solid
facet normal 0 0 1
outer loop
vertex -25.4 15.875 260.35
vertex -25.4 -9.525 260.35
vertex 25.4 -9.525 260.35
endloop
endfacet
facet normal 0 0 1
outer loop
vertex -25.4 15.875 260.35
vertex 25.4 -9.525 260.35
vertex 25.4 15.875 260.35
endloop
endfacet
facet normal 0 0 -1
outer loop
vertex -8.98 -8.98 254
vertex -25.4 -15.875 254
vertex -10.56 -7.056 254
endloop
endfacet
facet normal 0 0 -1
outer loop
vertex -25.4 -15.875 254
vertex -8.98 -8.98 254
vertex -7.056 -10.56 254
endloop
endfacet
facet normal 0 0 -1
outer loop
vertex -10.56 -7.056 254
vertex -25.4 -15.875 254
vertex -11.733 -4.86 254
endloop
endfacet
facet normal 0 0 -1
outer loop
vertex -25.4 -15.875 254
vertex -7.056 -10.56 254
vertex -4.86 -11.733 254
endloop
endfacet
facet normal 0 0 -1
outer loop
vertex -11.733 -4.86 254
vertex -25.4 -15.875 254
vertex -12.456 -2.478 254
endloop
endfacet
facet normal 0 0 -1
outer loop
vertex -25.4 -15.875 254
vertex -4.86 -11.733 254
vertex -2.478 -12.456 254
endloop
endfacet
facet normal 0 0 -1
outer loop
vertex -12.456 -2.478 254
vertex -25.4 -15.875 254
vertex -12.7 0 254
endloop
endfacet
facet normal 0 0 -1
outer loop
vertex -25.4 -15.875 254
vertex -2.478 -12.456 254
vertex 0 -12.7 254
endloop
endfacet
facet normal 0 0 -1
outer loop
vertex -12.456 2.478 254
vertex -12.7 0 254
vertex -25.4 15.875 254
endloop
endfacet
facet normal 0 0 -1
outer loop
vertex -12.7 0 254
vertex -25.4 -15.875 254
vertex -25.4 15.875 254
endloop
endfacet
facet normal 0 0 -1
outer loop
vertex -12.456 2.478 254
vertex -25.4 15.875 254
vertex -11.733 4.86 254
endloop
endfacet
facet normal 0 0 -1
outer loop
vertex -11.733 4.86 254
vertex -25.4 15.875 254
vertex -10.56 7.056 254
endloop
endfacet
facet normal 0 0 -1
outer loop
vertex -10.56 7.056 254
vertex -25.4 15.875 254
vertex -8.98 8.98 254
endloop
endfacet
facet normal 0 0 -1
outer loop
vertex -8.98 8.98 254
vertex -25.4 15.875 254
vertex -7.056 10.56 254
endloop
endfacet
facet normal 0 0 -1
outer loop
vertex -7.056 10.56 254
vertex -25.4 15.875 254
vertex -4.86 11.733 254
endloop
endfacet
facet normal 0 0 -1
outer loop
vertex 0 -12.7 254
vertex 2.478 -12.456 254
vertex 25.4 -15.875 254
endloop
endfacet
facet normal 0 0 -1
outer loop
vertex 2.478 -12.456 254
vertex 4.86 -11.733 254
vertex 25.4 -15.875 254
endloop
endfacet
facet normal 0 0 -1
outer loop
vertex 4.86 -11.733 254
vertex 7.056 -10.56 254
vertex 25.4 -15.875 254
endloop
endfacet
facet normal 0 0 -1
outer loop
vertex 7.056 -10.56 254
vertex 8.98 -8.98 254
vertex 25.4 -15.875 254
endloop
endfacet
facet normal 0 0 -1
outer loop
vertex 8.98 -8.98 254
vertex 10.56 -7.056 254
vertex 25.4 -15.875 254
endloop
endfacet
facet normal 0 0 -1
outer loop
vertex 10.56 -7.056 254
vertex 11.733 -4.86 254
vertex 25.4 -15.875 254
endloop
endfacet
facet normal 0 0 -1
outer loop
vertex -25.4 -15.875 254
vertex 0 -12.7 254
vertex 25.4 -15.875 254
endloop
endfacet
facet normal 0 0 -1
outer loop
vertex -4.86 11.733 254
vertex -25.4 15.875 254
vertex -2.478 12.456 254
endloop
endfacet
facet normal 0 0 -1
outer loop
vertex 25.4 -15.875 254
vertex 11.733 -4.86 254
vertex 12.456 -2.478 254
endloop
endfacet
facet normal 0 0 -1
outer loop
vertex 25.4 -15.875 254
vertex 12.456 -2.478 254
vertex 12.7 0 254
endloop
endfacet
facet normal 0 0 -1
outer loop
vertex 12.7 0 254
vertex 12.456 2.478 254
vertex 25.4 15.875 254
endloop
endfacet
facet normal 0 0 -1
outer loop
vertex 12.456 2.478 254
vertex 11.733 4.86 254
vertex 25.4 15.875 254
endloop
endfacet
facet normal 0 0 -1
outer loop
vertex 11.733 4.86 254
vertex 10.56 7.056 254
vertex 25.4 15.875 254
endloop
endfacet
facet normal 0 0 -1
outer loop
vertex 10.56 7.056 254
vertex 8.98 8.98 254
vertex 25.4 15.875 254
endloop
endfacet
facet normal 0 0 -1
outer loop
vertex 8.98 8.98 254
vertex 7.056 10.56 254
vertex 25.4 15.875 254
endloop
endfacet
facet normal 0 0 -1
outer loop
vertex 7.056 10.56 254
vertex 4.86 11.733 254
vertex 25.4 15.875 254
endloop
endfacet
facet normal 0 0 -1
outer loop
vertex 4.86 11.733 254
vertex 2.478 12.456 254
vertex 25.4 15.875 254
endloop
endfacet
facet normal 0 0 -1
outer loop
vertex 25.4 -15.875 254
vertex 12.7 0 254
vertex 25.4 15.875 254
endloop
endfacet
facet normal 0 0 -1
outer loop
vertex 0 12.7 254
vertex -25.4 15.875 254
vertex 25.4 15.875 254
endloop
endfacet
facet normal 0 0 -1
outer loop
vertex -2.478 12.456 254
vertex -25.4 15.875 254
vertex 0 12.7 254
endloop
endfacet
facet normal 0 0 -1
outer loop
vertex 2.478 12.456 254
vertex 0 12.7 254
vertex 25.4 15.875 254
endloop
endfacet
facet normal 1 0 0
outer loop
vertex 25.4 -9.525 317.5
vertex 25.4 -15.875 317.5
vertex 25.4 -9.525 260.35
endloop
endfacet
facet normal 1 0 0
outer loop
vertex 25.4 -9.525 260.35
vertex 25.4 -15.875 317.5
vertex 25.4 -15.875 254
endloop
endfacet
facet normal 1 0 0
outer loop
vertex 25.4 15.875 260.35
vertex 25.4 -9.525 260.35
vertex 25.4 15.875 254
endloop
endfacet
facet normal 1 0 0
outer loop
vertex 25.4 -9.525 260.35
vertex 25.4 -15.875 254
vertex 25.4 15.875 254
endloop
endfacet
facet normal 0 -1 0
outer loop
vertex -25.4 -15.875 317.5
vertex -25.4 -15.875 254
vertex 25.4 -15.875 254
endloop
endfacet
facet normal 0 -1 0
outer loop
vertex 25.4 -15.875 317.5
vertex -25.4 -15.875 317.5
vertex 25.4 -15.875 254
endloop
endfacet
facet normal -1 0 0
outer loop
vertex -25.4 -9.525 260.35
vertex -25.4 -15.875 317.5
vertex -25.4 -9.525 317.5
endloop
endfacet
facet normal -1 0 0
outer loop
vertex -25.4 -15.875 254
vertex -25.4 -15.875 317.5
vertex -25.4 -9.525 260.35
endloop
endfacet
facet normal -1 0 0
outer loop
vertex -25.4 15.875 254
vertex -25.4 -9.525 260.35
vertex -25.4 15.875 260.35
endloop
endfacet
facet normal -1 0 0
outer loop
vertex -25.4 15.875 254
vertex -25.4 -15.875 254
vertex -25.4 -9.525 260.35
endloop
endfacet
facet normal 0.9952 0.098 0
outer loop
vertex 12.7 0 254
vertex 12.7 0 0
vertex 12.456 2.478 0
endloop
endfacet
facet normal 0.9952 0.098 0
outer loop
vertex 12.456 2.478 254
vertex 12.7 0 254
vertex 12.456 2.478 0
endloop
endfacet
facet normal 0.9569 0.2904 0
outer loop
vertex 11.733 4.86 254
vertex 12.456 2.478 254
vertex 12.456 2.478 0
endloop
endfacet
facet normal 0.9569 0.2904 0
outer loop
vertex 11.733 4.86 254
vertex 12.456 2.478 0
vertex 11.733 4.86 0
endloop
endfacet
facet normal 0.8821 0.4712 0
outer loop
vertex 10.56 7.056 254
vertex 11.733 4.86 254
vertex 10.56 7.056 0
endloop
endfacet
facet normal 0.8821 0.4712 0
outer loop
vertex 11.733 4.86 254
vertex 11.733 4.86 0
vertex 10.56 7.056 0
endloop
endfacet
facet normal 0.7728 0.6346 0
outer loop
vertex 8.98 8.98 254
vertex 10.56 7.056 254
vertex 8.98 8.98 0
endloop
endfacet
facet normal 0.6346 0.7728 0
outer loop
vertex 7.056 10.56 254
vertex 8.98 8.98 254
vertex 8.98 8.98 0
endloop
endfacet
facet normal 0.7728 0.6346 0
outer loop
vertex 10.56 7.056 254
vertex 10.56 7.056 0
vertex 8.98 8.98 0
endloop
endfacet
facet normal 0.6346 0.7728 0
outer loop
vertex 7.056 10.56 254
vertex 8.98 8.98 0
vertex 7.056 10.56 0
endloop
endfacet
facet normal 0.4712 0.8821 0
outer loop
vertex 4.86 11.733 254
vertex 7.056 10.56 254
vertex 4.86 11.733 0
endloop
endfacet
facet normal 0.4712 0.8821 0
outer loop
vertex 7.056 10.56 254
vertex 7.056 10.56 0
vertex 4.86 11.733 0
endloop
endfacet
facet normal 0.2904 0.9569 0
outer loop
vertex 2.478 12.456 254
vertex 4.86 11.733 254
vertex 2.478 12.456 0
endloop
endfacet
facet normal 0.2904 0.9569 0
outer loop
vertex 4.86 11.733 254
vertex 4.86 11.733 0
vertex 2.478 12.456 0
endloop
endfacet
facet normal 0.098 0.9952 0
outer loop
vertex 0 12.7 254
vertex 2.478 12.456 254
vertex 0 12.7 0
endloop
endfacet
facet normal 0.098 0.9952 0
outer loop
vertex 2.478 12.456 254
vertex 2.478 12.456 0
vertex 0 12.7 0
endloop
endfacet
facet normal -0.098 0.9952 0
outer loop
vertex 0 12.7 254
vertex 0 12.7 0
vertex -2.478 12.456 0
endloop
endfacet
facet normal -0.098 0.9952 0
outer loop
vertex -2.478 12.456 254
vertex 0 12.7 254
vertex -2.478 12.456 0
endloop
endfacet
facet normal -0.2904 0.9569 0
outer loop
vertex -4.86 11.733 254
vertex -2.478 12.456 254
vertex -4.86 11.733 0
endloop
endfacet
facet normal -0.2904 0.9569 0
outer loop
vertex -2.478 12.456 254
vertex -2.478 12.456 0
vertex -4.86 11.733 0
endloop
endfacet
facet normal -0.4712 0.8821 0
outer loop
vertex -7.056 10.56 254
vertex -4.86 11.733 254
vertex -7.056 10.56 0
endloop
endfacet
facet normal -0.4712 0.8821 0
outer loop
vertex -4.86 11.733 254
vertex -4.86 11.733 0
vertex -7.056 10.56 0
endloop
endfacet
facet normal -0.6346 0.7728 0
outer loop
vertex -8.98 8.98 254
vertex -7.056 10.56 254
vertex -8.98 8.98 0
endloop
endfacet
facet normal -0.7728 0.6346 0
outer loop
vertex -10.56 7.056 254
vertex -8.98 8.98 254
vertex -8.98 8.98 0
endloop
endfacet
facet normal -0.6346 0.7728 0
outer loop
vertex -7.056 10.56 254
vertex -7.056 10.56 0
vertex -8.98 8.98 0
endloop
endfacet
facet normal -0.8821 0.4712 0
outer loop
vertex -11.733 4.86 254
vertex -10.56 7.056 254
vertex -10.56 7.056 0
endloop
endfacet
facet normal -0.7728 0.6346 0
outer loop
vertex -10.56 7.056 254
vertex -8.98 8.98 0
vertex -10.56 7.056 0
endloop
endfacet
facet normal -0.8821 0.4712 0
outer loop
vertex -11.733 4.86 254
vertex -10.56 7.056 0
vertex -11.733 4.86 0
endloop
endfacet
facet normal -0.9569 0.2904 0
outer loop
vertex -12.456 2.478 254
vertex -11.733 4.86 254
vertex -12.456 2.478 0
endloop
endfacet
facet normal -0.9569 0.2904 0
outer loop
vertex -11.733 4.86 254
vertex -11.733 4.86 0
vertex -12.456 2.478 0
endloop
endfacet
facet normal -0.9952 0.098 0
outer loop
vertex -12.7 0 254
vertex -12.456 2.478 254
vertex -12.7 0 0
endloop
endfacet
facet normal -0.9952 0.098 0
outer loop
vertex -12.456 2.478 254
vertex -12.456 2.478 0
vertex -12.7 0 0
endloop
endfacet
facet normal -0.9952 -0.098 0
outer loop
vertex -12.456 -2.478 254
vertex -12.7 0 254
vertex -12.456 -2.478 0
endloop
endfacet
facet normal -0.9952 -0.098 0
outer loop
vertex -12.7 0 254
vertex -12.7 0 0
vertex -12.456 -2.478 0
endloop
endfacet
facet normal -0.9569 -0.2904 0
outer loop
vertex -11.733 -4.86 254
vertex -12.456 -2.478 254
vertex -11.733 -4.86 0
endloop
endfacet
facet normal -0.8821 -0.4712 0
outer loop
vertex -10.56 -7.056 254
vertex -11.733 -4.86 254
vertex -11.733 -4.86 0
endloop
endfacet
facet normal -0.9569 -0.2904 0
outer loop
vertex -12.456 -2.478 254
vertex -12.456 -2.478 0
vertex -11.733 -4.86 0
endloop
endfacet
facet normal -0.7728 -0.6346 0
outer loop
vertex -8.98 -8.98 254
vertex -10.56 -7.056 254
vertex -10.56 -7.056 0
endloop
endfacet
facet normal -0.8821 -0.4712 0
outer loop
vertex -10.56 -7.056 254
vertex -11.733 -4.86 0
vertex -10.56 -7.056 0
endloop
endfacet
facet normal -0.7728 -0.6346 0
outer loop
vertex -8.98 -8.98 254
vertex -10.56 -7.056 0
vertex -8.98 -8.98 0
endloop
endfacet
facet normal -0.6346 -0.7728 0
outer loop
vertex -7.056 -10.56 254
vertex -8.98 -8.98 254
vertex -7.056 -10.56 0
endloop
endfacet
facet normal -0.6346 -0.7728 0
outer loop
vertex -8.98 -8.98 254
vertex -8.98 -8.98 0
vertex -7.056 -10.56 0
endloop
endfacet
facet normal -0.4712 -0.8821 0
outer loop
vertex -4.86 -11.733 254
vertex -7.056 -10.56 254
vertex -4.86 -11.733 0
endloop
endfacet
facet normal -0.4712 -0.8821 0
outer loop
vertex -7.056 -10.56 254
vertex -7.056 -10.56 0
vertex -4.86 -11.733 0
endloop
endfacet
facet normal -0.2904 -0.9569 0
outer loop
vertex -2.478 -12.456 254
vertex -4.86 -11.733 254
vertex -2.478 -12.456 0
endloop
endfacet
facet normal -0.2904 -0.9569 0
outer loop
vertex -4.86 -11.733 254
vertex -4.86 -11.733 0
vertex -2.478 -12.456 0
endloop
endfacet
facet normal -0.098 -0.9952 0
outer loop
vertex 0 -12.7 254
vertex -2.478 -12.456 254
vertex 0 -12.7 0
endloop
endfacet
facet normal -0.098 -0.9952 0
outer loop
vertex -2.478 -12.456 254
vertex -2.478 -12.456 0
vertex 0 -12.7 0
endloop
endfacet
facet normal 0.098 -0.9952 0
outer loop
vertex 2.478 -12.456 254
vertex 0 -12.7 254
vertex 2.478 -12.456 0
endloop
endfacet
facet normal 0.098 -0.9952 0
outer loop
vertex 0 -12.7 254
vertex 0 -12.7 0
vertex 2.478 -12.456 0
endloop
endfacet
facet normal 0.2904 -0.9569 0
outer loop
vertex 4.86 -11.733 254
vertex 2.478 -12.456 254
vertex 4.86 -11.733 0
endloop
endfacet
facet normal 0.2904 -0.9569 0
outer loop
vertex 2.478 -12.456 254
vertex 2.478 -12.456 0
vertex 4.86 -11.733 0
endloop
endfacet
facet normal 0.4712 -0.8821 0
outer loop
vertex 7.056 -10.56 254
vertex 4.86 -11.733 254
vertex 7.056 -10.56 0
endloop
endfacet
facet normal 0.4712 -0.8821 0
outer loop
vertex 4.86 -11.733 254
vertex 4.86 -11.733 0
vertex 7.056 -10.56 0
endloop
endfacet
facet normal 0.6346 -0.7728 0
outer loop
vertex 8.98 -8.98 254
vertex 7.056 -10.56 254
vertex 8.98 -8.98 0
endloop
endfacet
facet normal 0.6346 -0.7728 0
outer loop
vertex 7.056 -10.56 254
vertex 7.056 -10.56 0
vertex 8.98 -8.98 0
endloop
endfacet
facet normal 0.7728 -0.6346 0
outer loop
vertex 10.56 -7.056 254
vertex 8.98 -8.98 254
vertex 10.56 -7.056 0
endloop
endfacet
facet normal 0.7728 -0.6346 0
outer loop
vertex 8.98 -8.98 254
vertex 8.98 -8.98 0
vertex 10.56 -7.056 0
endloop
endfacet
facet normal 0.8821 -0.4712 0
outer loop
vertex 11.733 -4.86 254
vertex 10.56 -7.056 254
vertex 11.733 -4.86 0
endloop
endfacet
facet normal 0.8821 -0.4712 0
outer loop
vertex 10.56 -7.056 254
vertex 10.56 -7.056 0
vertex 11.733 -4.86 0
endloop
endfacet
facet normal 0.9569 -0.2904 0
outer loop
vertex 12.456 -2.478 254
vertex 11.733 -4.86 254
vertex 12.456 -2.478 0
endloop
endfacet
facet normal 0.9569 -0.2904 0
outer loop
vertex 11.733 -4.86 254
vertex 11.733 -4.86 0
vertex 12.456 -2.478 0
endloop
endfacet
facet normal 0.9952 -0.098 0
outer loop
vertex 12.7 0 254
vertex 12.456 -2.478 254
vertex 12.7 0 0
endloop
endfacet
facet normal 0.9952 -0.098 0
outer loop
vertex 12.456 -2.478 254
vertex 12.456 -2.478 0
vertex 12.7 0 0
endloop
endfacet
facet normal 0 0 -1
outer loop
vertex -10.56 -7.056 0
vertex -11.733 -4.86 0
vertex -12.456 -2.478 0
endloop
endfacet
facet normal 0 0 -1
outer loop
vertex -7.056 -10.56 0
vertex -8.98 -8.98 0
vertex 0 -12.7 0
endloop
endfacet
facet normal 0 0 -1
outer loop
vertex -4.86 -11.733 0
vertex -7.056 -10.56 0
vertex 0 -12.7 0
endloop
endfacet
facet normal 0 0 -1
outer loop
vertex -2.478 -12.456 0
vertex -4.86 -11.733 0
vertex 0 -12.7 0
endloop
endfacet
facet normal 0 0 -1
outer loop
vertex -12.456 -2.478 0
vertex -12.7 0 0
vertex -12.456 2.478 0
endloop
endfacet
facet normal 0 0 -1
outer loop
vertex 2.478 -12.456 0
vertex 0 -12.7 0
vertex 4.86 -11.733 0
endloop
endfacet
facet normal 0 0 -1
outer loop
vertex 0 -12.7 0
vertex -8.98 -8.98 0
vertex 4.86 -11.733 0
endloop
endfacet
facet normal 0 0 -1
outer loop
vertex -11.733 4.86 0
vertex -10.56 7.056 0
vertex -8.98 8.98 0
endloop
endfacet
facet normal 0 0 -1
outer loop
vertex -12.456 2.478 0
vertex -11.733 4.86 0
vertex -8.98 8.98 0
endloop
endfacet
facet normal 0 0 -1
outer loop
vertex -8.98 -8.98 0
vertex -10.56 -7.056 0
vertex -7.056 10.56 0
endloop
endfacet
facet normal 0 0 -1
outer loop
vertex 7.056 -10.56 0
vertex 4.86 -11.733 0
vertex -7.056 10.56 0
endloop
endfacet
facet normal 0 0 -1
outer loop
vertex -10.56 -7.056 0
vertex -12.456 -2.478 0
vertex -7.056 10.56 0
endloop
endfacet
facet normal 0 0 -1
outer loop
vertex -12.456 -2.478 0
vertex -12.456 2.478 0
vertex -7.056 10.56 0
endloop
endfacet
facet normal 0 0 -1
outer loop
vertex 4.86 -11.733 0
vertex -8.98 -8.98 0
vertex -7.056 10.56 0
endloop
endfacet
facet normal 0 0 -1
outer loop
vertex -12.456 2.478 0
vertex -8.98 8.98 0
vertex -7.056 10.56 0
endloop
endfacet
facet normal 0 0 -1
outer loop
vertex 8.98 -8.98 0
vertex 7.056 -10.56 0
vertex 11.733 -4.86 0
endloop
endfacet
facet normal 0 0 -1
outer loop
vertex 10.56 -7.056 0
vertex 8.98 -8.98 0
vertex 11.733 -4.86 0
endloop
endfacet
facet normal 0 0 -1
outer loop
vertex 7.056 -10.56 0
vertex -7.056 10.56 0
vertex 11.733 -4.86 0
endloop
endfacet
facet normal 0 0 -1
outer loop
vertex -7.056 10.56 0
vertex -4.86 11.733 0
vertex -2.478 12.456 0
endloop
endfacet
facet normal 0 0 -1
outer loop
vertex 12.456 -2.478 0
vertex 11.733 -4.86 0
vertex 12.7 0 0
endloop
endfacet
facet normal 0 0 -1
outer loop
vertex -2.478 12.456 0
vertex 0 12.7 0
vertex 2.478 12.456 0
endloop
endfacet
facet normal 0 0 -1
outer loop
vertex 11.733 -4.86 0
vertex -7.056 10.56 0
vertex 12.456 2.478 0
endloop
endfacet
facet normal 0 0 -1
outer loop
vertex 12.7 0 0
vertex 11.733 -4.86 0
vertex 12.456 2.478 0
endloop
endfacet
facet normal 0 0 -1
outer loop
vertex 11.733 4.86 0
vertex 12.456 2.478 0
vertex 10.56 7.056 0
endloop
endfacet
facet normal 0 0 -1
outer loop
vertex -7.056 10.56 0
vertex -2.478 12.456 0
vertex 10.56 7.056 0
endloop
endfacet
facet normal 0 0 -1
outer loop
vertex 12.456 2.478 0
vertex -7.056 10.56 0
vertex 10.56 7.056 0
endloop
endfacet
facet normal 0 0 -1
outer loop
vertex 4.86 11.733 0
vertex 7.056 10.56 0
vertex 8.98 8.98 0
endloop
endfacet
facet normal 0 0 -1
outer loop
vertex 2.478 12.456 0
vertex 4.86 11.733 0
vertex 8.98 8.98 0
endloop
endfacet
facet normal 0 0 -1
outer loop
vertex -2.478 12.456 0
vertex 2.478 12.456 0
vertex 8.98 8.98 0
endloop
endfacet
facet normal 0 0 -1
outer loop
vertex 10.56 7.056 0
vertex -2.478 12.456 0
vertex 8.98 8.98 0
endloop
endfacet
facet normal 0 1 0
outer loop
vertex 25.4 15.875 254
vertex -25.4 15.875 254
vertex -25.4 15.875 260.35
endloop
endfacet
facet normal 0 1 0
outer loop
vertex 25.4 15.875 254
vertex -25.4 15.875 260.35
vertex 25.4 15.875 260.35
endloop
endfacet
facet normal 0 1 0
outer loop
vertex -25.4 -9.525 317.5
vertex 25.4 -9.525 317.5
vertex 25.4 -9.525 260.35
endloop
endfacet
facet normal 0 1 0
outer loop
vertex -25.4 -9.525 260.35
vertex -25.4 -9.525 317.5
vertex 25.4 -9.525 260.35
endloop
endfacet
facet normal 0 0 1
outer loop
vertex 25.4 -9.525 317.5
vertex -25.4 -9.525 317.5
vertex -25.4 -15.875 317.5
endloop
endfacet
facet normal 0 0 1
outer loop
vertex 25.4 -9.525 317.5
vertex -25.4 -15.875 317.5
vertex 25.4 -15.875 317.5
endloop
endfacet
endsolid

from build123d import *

# Parameters (mm, degrees)
SKETCH1_R           = 12.7
BOSS_EXTRUDE1_DEPTH = 254
SKETCH2_W           = 50.8
SKETCH2_H           = 31.75
BOSS_EXTRUDE2_DEPTH = 63.5
CUT_EXTRUDE1_REACH  = 52.8
SKETCH3_W           = 57.15
SKETCH3_H           = 25.4


with BuildPart() as part:
    # Sketch1 → Boss-Extrude1 (new body)
    with BuildSketch(Plane.XY):
        Circle(SKETCH1_R)
    extrude(amount=BOSS_EXTRUDE1_DEPTH)

    # Sketch2 → Boss-Extrude2 (add)
    with BuildSketch(Plane.XY.offset(254)):
        Rectangle(SKETCH2_W, SKETCH2_H)
    extrude(amount=BOSS_EXTRUDE2_DEPTH)

    # Sketch3 → Cut-Extrude1 (cut, up to next)
    with BuildSketch(Plane(origin=(25.4, 0, 0), x_dir=(0, 0, -1), z_dir=(1, 0, 0)), mode=Mode.PRIVATE) as cut_extrude1_sk1:
        with Locations((-288.925, 3.175)):
            Rectangle(SKETCH3_W, SKETCH3_H)
    cut_extrude1_tool1 = extrude(cut_extrude1_sk1.sketch, amount=-CUT_EXTRUDE1_REACH, mode=Mode.PRIVATE) & part.part
    add(cut_extrude1_tool1.solids().sort_by_distance((25.4, 3.175, 288.925))[0], mode=Mode.SUBTRACT)


solid = part.part
